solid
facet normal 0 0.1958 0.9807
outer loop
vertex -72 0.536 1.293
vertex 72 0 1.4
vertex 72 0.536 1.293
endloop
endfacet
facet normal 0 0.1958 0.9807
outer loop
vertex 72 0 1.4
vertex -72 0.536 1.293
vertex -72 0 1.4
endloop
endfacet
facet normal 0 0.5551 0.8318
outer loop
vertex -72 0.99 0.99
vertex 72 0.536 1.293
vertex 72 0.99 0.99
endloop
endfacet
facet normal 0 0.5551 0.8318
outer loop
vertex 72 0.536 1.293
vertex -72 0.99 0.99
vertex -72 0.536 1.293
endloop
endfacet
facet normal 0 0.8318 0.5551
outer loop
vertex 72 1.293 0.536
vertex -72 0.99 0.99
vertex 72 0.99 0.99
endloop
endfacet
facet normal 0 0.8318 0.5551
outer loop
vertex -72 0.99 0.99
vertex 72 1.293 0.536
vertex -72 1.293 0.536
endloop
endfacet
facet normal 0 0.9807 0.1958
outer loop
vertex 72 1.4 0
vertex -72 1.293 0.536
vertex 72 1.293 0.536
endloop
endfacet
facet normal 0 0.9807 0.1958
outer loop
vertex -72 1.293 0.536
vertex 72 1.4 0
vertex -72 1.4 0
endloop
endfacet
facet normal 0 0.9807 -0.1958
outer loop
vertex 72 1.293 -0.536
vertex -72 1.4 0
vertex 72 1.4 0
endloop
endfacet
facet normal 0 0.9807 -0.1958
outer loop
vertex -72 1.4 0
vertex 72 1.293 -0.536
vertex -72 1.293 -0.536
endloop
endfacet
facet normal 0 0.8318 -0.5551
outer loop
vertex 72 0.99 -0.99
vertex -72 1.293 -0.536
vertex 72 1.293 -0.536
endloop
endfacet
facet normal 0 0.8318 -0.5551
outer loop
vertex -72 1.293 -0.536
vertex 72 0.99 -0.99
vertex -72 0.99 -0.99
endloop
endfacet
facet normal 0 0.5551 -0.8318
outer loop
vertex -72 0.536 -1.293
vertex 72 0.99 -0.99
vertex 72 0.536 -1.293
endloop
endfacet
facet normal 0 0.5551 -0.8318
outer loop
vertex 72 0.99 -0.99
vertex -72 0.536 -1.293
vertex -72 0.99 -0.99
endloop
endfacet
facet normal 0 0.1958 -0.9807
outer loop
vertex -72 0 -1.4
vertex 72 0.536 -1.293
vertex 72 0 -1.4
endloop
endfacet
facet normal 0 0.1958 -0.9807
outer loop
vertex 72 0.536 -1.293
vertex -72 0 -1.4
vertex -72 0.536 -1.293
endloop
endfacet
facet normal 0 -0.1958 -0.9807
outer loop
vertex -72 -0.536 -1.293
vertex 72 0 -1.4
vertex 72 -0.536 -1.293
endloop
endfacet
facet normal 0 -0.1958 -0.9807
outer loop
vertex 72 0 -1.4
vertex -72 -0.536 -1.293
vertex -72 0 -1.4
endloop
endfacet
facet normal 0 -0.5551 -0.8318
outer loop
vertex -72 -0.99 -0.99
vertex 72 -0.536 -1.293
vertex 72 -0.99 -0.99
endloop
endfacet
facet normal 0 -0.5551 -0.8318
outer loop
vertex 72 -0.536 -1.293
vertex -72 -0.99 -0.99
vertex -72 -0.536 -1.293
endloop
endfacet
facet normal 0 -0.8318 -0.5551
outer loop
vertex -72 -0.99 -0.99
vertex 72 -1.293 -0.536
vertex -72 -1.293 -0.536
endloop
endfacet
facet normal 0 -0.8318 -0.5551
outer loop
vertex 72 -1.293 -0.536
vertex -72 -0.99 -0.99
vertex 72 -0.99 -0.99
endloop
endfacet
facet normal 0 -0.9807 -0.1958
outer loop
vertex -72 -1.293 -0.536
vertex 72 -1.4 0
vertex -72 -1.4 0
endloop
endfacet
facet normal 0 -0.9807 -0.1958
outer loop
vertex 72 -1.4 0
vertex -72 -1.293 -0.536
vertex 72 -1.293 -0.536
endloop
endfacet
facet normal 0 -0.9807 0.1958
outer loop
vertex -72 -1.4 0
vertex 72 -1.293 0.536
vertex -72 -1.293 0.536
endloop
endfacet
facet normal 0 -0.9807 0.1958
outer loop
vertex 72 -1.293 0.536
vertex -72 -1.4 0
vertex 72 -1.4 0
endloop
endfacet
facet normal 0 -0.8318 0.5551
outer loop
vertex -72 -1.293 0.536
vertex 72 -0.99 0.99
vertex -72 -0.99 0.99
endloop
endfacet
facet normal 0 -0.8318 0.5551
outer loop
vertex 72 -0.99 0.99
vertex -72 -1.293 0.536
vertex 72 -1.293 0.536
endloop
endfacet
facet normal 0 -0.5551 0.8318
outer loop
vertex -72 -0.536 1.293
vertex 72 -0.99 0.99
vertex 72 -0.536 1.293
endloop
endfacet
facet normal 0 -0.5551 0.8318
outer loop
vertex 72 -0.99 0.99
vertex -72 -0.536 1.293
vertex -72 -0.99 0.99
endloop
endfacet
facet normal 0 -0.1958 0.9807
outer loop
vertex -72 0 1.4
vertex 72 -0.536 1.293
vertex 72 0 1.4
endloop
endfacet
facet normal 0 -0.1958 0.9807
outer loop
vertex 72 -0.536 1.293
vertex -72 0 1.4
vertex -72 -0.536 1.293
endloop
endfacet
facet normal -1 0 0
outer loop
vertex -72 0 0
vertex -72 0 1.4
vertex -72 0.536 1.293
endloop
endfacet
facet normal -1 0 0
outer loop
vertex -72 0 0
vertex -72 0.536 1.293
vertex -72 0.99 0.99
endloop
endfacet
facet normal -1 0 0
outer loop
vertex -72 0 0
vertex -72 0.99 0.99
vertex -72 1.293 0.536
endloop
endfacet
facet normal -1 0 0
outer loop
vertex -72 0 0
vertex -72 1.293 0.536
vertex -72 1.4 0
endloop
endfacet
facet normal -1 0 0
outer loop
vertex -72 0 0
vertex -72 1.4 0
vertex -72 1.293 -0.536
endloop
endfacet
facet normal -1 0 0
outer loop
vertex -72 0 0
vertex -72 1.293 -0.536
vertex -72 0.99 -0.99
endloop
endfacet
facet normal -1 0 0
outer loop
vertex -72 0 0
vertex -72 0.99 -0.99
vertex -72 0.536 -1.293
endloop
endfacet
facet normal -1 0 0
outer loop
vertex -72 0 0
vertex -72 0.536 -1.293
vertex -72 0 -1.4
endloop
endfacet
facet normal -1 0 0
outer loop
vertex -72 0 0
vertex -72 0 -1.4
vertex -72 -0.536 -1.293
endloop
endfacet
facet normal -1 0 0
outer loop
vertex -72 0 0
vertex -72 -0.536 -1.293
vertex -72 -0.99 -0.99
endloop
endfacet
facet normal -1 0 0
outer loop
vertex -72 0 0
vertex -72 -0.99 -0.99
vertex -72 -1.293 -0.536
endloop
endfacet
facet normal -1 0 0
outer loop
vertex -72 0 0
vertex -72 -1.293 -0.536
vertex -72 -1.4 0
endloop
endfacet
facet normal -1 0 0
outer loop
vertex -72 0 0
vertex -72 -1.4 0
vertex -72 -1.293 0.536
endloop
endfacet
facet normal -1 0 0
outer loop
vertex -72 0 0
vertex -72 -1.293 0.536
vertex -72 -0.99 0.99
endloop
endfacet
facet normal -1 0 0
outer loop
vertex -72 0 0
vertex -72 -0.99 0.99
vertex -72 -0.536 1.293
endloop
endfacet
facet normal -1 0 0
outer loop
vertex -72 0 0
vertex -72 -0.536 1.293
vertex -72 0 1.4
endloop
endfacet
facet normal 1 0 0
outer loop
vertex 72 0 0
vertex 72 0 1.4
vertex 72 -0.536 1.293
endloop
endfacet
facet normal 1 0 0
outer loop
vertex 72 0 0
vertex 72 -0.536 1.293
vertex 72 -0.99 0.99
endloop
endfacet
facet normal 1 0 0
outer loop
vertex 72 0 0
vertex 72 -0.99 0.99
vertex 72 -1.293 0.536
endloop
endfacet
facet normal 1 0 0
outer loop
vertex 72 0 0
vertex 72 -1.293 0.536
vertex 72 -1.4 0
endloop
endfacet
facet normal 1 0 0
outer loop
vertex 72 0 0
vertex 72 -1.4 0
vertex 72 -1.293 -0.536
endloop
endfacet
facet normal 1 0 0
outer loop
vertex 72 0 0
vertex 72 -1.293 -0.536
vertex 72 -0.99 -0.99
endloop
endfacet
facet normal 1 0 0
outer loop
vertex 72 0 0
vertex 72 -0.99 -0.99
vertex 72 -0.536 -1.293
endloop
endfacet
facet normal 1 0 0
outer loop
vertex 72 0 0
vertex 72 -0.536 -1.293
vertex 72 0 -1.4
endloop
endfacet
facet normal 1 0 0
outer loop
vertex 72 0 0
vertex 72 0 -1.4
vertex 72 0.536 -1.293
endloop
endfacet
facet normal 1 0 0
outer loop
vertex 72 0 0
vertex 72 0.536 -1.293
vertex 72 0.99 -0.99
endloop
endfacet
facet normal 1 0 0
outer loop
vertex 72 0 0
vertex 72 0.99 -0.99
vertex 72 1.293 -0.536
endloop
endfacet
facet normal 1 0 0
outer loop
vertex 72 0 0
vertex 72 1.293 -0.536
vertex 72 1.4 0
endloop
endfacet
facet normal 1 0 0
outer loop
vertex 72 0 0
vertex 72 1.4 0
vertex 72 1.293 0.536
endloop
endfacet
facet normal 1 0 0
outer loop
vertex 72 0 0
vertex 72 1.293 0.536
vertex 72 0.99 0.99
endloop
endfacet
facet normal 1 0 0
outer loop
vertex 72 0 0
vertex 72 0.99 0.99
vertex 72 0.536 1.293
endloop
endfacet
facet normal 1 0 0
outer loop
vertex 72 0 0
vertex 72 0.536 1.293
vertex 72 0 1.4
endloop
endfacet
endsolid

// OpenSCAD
// file: ../p/4-4edge.scad
use <../lib.scad>
function ldraw_lib__4_4edge() = [
// 0 Circle 1.0
// 0 Name: 4-4edge.dat
// 0 Author: James Jessiman
// 0 !LDRAW_ORG Primitive UPDATE 2017-01
// 0 !LICENSE Licensed under CC BY 2.0 and CC BY 4.0 : see CAreadme.txt
// 
// 0 BFC CERTIFY CCW
  [0,"BFC","CERTIFY"],
  [0,"BFC","CCW"],
// 
// 0 !HISTORY 1998-12-15 [PTadmin] Official Update 1998-10
// 0 !HISTORY 2005-12-28 [PTadmin] Official Update 2005-01
// 0 !HISTORY 2007-06-24 [PTadmin] Header formatted for Contributor Agreement
// 0 !HISTORY 2008-07-01 [PTadmin] Official Update 2008-01
// 0 !HISTORY 2017-01-15 [Steffen] BFCed
// 0 !HISTORY 2017-12-30 [PTadmin] Official Update 2017-01
// 
// 
// 2 24 1 0 0 0.9239 0 0.3827
  [2,24,1,0,0,0.9239,0,0.3827],
// 2 24 0.9239 0 0.3827 0.7071 0 0.7071
  [2,24,0.9239,0,0.3827,0.7071,0,0.7071],
// 2 24 0.7071 0 0.7071 0.3827 0 0.9239
  [2,24,0.7071,0,0.7071,0.3827,0,0.9239],
// 2 24 0.3827 0 0.9239 0 0 1
  [2,24,0.3827,0,0.9239,0,0,1],
// 2 24 0 0 1 -0.3827 0 0.9239
  [2,24,0,0,1,-0.3827,0,0.9239],
// 2 24 -0.3827 0 0.9239 -0.7071 0 0.7071
  [2,24,-0.3827,0,0.9239,-0.7071,0,0.7071],
// 2 24 -0.7071 0 0.7071 -0.9239 0 0.3827
  [2,24,-0.7071,0,0.7071,-0.9239,0,0.3827],
// 2 24 -0.9239 0 0.3827 -1 0 -0
  [2,24,-0.9239,0,0.3827,-1,0,-0],
// 2 24 -1 0 -0 -0.9239 0 -0.3827
  [2,24,-1,0,-0,-0.9239,0,-0.3827],
// 2 24 -0.9239 0 -0.3827 -0.7071 0 -0.7071
  [2,24,-0.9239,0,-0.3827,-0.7071,0,-0.7071],
// 2 24 -0.7071 0 -0.7071 -0.3827 0 -0.9239
  [2,24,-0.7071,0,-0.7071,-0.3827,0,-0.9239],
// 2 24 -0.3827 0 -0.9239 0 0 -1
  [2,24,-0.3827,0,-0.9239,0,0,-1],
// 2 24 0 0 -1 0.3827 0 -0.9239
  [2,24,0,0,-1,0.3827,0,-0.9239],
// 2 24 0.3827 0 -0.9239 0.7071 0 -0.7071
  [2,24,0.3827,0,-0.9239,0.7071,0,-0.7071],
// 2 24 0.7071 0 -0.7071 0.9239 0 -0.3827
  [2,24,0.7071,0,-0.7071,0.9239,0,-0.3827],
// 2 24 0.9239 0 -0.3827 1 0 0
  [2,24,0.9239,0,-0.3827,1,0,0],
];
makepoly(ldraw_lib__4_4edge(), line=0.2);
// file: ../p/4-4disc.scad
use <../lib.scad>
function ldraw_lib__4_4disc() = [
// 0 Disc 1.0
// 0 Name: 4-4disc.dat
// 0 Author: James Jessiman
// 0 !LDRAW_ORG Primitive UPDATE 2002-02
// 0 !LICENSE Licensed under CC BY 2.0 and CC BY 4.0 : see CAreadme.txt
// 
// 0 BFC CERTIFY CCW
  [0,"BFC","CERTIFY"],
  [0,"BFC","CCW"],
// 
// 0 !HISTORY 1998-12-15 [PTadmin] Official Update 1998-10
// 0 !HISTORY 2002-03-23 [sbliss] Added BFC statement
// 0 !HISTORY 2002-04-25 [PTadmin] Official Update 2002-02
// 0 !HISTORY 2007-06-24 [PTadmin] Header formatted for Contributor Agreement
// 0 !HISTORY 2008-07-01 [PTadmin] Official Update 2008-01
// 
// 
// 3 16 0 0 0 1 0 0 0.9239 0 0.3827
  [3,16,0,0,0,1,0,0,0.9239,0,0.3827],
// 3 16 0 0 0 0.9239 0 0.3827 0.7071 0 0.7071
  [3,16,0,0,0,0.9239,0,0.3827,0.7071,0,0.7071],
// 3 16 0 0 0 0.7071 0 0.7071 0.3827 0 0.9239
  [3,16,0,0,0,0.7071,0,0.7071,0.3827,0,0.9239],
// 3 16 0 0 0 0.3827 0 0.9239 0 0 1
  [3,16,0,0,0,0.3827,0,0.9239,0,0,1],
// 3 16 0 0 0 0 0 1 -0.3827 0 0.9239
  [3,16,0,0,0,0,0,1,-0.3827,0,0.9239],
// 3 16 0 0 0 -0.3827 0 0.9239 -0.7071 0 0.7071
  [3,16,0,0,0,-0.3827,0,0.9239,-0.7071,0,0.7071],
// 3 16 0 0 0 -0.7071 0 0.7071 -0.9239 0 0.3827
  [3,16,0,0,0,-0.7071,0,0.7071,-0.9239,0,0.3827],
// 3 16 0 0 0 -0.9239 0 0.3827 -1 0 -0
  [3,16,0,0,0,-0.9239,0,0.3827,-1,0,-0],
// 3 16 0 0 0 -1 0 -0 -0.9239 0 -0.3827
  [3,16,0,0,0,-1,0,-0,-0.9239,0,-0.3827],
// 3 16 0 0 0 -0.9239 0 -0.3827 -0.7071 0 -0.7071
  [3,16,0,0,0,-0.9239,0,-0.3827,-0.7071,0,-0.7071],
// 3 16 0 0 0 -0.7071 0 -0.7071 -0.3827 0 -0.9239
  [3,16,0,0,0,-0.7071,0,-0.7071,-0.3827,0,-0.9239],
// 3 16 0 0 0 -0.3827 0 -0.9239 0 0 -1
  [3,16,0,0,0,-0.3827,0,-0.9239,0,0,-1],
// 3 16 0 0 0 0 0 -1 0.3827 0 -0.9239
  [3,16,0,0,0,0,0,-1,0.3827,0,-0.9239],
// 3 16 0 0 0 0.3827 0 -0.9239 0.7071 0 -0.7071
  [3,16,0,0,0,0.3827,0,-0.9239,0.7071,0,-0.7071],
// 3 16 0 0 0 0.7071 0 -0.7071 0.9239 0 -0.3827
  [3,16,0,0,0,0.7071,0,-0.7071,0.9239,0,-0.3827],
// 3 16 0 0 0 0.9239 0 -0.3827 1 0 0
  [3,16,0,0,0,0.9239,0,-0.3827,1,0,0],
// 0
];
makepoly(ldraw_lib__4_4disc(), line=0.2);
// file: ../p/4-4cyli.scad
use <../lib.scad>
function ldraw_lib__4_4cyli() = [
// 0 Cylinder 1.0
// 0 Name: 4-4cyli.dat
// 0 Author: James Jessiman
// 0 !LDRAW_ORG Primitive UPDATE 2005-01
// 0 !LICENSE Licensed under CC BY 2.0 and CC BY 4.0 : see CAreadme.txt
// 
// 0 BFC CERTIFY CCW
  [0,"BFC","CERTIFY"],
  [0,"BFC","CCW"],
// 
// 0 !HISTORY 1998-12-15 [PTadmin] Official Update 1998-10
// 0 !HISTORY 2002-03-23 [sbliss] Added BFC statement; merged headers from files in distributions LDraw 0.27 and Complete.
// 0 !HISTORY 2002-04-25 [PTadmin] Official Update 2002-02
// 0 !HISTORY 2004-12-14 [guyvivan] BFC CCW
// 0 !HISTORY 2005-12-28 [PTadmin] Official Update 2005-01
// 0 !HISTORY 2007-06-24 [PTadmin] Header formatted for Contributor Agreement
// 0 !HISTORY 2008-07-01 [PTadmin] Official Update 2008-01
// 
// 
// 4 16 1 1 0 0.9239 1 0.3827 0.9239 0 0.3827 1 0 0
  [4,16,1,1,0,0.9239,1,0.3827,0.9239,0,0.3827,1,0,0],
// 5 24 1 0 0 1 1 0 0.9239 0 0.3827 0.9239 0 -0.3827
  [5,24,1,0,0,1,1,0,0.9239,0,0.3827,0.9239,0,-0.3827],
// 4 16 0.9239 1 0.3827 0.7071 1 0.7071 0.7071 0 0.7071 0.9239 0 0.3827
  [4,16,0.9239,1,0.3827,0.7071,1,0.7071,0.7071,0,0.7071,0.9239,0,0.3827],
// 5 24 0.9239 0 0.3827 0.9239 1 0.3827 0.7071 0 0.7071 1 0 0
  [5,24,0.9239,0,0.3827,0.9239,1,0.3827,0.7071,0,0.7071,1,0,0],
// 4 16 0.7071 1 0.7071 0.3827 1 0.9239 0.3827 0 0.9239 0.7071 0 0.7071
  [4,16,0.7071,1,0.7071,0.3827,1,0.9239,0.3827,0,0.9239,0.7071,0,0.7071],
// 5 24 0.7071 0 0.7071 0.7071 1 0.7071 0.3827 0 0.9239 0.9239 0 0.3827
  [5,24,0.7071,0,0.7071,0.7071,1,0.7071,0.3827,0,0.9239,0.9239,0,0.3827],
// 4 16 0.3827 1 0.9239 0 1 1 0 0 1 0.3827 0 0.9239
  [4,16,0.3827,1,0.9239,0,1,1,0,0,1,0.3827,0,0.9239],
// 5 24 0.3827 0 0.9239 0.3827 1 0.9239 0 0 1 0.7071 0 0.7071
  [5,24,0.3827,0,0.9239,0.3827,1,0.9239,0,0,1,0.7071,0,0.7071],
// 4 16 0 1 1 -0.3827 1 0.9239 -0.3827 0 0.9239 0 0 1
  [4,16,0,1,1,-0.3827,1,0.9239,-0.3827,0,0.9239,0,0,1],
// 5 24 0 0 1 0 1 1 -0.3827 0 0.9239 0.3827 0 0.9239
  [5,24,0,0,1,0,1,1,-0.3827,0,0.9239,0.3827,0,0.9239],
// 4 16 -0.3827 1 0.9239 -0.7071 1 0.7071 -0.7071 0 0.7071 -0.3827 0 0.9239
  [4,16,-0.3827,1,0.9239,-0.7071,1,0.7071,-0.7071,0,0.7071,-0.3827,0,0.9239],
// 5 24 -0.3827 0 0.9239 -0.3827 1 0.9239 -0.7071 0 0.7071 0 0 1
  [5,24,-0.3827,0,0.9239,-0.3827,1,0.9239,-0.7071,0,0.7071,0,0,1],
// 4 16 -0.7071 1 0.7071 -0.9239 1 0.3827 -0.9239 0 0.3827 -0.7071 0 0.7071
  [4,16,-0.7071,1,0.7071,-0.9239,1,0.3827,-0.9239,0,0.3827,-0.7071,0,0.7071],
// 5 24 -0.7071 0 0.7071 -0.7071 1 0.7071 -0.9239 0 0.3827 -0.3827 0 0.9239
  [5,24,-0.7071,0,0.7071,-0.7071,1,0.7071,-0.9239,0,0.3827,-0.3827,0,0.9239],
// 4 16 -0.9239 1 0.3827 -1 1 0 -1 0 0 -0.9239 0 0.3827
  [4,16,-0.9239,1,0.3827,-1,1,0,-1,0,0,-0.9239,0,0.3827],
// 5 24 -0.9239 0 0.3827 -0.9239 1 0.3827 -1 0 0 -0.7071 0 0.7071
  [5,24,-0.9239,0,0.3827,-0.9239,1,0.3827,-1,0,0,-0.7071,0,0.7071],
// 4 16 -1 1 0 -0.9239 1 -0.3827 -0.9239 0 -0.3827 -1 0 0
  [4,16,-1,1,0,-0.9239,1,-0.3827,-0.9239,0,-0.3827,-1,0,0],
// 5 24 -1 0 0 -1 1 0 -0.9239 0 -0.3827 -0.9239 0 0.3827
  [5,24,-1,0,0,-1,1,0,-0.9239,0,-0.3827,-0.9239,0,0.3827],
// 4 16 -0.9239 1 -0.3827 -0.7071 1 -0.7071 -0.7071 0 -0.7071 -0.9239 0 -0.3827
  [4,16,-0.9239,1,-0.3827,-0.7071,1,-0.7071,-0.7071,0,-0.7071,-0.9239,0,-0.3827],
// 5 24 -0.9239 0 -0.3827 -0.9239 1 -0.3827 -0.7071 0 -0.7071 -1 0 0
  [5,24,-0.9239,0,-0.3827,-0.9239,1,-0.3827,-0.7071,0,-0.7071,-1,0,0],
// 4 16 -0.7071 1 -0.7071 -0.3827 1 -0.9239 -0.3827 0 -0.9239 -0.7071 0 -0.7071
  [4,16,-0.7071,1,-0.7071,-0.3827,1,-0.9239,-0.3827,0,-0.9239,-0.7071,0,-0.7071],
// 5 24 -0.7071 0 -0.7071 -0.7071 1 -0.7071 -0.3827 0 -0.9239 -0.9239 0 -0.3827
  [5,24,-0.7071,0,-0.7071,-0.7071,1,-0.7071,-0.3827,0,-0.9239,-0.9239,0,-0.3827],
// 4 16 -0.3827 1 -0.9239 0 1 -1 0 0 -1 -0.3827 0 -0.9239
  [4,16,-0.3827,1,-0.9239,0,1,-1,0,0,-1,-0.3827,0,-0.9239],
// 5 24 -0.3827 0 -0.9239 -0.3827 1 -0.9239 0 0 -1 -0.7071 0 -0.7071
  [5,24,-0.3827,0,-0.9239,-0.3827,1,-0.9239,0,0,-1,-0.7071,0,-0.7071],
// 4 16 0 1 -1 0.3827 1 -0.9239 0.3827 0 -0.9239 0 0 -1
  [4,16,0,1,-1,0.3827,1,-0.9239,0.3827,0,-0.9239,0,0,-1],
// 5 24 0 0 -1 0 1 -1 0.3827 0 -0.9239 -0.3827 0 -0.9239
  [5,24,0,0,-1,0,1,-1,0.3827,0,-0.9239,-0.3827,0,-0.9239],
// 4 16 0.3827 1 -0.9239 0.7071 1 -0.7071 0.7071 0 -0.7071 0.3827 0 -0.9239
  [4,16,0.3827,1,-0.9239,0.7071,1,-0.7071,0.7071,0,-0.7071,0.3827,0,-0.9239],
// 5 24 0.3827 0 -0.9239 0.3827 1 -0.9239 0.7071 0 -0.7071 0 0 -1
  [5,24,0.3827,0,-0.9239,0.3827,1,-0.9239,0.7071,0,-0.7071,0,0,-1],
// 4 16 0.7071 1 -0.7071 0.9239 1 -0.3827 0.9239 0 -0.3827 0.7071 0 -0.7071
  [4,16,0.7071,1,-0.7071,0.9239,1,-0.3827,0.9239,0,-0.3827,0.7071,0,-0.7071],
// 5 24 0.7071 0 -0.7071 0.7071 1 -0.7071 0.9239 0 -0.3827 0.3827 0 -0.9239
  [5,24,0.7071,0,-0.7071,0.7071,1,-0.7071,0.9239,0,-0.3827,0.3827,0,-0.9239],
// 4 16 0.9239 1 -0.3827 1 1 0 1 0 0 0.9239 0 -0.3827
  [4,16,0.9239,1,-0.3827,1,1,0,1,0,0,0.9239,0,-0.3827],
// 5 24 0.9239 0 -0.3827 0.9239 1 -0.3827 1 0 0 0.7071 0 -0.7071
  [5,24,0.9239,0,-0.3827,0.9239,1,-0.3827,1,0,0,0.7071,0,-0.7071],
// 0
];
makepoly(ldraw_lib__4_4cyli(), line=0.2);
// main file
use <../lib.scad>
use <../p/4-4cyli.scad>
use <../p/4-4disc.scad>
use <../p/4-4edge.scad>
function ldraw_lib__u9012() = [
// 0 ~Technic Axle Flexible 26 - Flexible Part
// 0 Name: u9012.dat
// 0 Author: Michael Heidemann [mikeheide]
// 0 !LDRAW_ORG Part UPDATE 2010-03
// 0 !LICENSE Licensed under CC BY 2.0 and CC BY 4.0 : see CAreadme.txt
// 
// 0 BFC CERTIFY CCW
  [0,"BFC","CERTIFY"],
  [0,"BFC","CCW"],
// 
// 0 !HISTORY 2010-12-31 [PTadmin] Official Update 2010-03
// 
// 
// 1 16 -180 0 0 0 360 0 -3.5 0 0 0 0 3.5 4-4cyli.dat
  [1,16,-180,0,0,0,360,0,-3.5,0,0,0,0,3.5, ldraw_lib__4_4cyli()],
// 1 16 -180 0 0 0 340 0 -3.5 0 0 0 0 3.5 4-4edge.dat
  [1,16,-180,0,0,0,340,0,-3.5,0,0,0,0,3.5, ldraw_lib__4_4edge()],
// 1 16 -180 0 0 0 340 0 -3.5 0 0 0 0 3.5 4-4disc.dat
  [1,16,-180,0,0,0,340,0,-3.5,0,0,0,0,3.5, ldraw_lib__4_4disc()],
// 1 16 180 0 0 0 340 0 -3.5 0 0 0 0 3.5 4-4edge.dat
  [1,16,180,0,0,0,340,0,-3.5,0,0,0,0,3.5, ldraw_lib__4_4edge()],
// 1 16 180 0 0 0 -340 0 -3.5 0 0 0 0 -3.5 4-4disc.dat
  [1,16,180,0,0,0,-340,0,-3.5,0,0,0,0,-3.5, ldraw_lib__4_4disc()],
// 0
// 0
// 0
];
makepoly(ldraw_lib__u9012(), line=0.2);
